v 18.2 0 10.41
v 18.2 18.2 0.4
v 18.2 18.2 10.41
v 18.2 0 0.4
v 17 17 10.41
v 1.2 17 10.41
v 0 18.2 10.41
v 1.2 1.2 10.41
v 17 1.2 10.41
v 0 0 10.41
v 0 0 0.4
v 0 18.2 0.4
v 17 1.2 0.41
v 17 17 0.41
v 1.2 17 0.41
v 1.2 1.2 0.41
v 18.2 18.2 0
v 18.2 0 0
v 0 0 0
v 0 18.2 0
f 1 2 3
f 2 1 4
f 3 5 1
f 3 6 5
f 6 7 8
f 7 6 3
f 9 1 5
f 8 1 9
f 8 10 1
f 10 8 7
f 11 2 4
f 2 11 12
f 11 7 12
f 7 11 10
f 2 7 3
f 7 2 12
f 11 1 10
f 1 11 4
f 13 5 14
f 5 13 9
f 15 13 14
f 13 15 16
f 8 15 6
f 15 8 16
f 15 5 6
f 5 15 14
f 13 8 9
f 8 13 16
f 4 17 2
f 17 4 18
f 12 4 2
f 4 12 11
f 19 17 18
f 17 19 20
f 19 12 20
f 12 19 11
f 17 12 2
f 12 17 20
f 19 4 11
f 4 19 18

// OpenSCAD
// file: ../../Base/Boxes.scad
// Fischertechnik Box Foundation
// Pre-designed Boxes

use <Constants.scad>

include <PlacementOptions.scad>

box190Width = 190;
box190Depth = 130;
box130Width = 130;
box130Depth = 95;
boxUsageHeight = 33.9;
boxWallThickness = 2.4;
boxBaseThickness = 1.0;
boxWebWidth = 3.0;

// getBoxWallThickness()
// Gets the wall thickness of a Fischertechnik Box

function getBoxWallThickness() = boxWallThickness;

// Gets the usable height of a fischertechnik box
function getBoxUsageHeight() = boxUsageHeight;

// Gets the thickness of the Fischertechnik box base.
function getBoxBaseThickness() = boxBaseThickness;

// Gets the width of a box web
function getBoxWebWidth() = boxWebWidth;

// Gets the usable inner space of a Box 190 as an x/y-list
function getBox190Space() = [
    box190Width - 2*getBoxWallThickness(), 
    box190Depth - 2*getBoxWallThickness() ];

// Imports the Fischertechnik empty box 130x190 mm and places it at position 0,0
// 190x130 are the outer sizes, the inner space is slightly smaller. Use getBox190Space() to get the inner sizes.
// This module needs the STL file "Fischertechnik Box 130x190.stl" in the library path.
// The box is positioned that the usable inner space is at the 0,0,0 position. The

module Box190() {
    translate([-getBoxWallThickness(),-getBoxWallThickness(),-getBoxBaseThickness()])
        import("Fischertechnik Box 130x190.stl", convexity=3);
}

// Gets the usable inner space of a Box 130 as an x/y-list
function getBox130Space() = [
    box130Width - 2*getBoxWallThickness(), 
    box130Depth - 2*getBoxWallThickness() ];

// Imports the Fischertechnik empty box 95x130 mm and places it at position 0,0
// 190x130 are the outer sizes, the inner space is slightly smaller. Use getBox190Space() to get the inner sizes.
// This module needs the STL file "Fischertechnik Box 95x130.stl" in the library path.
// The box is positioned that the usable inner space is at the 0,0,0 position. The

module Box130() {
    translate([-getBoxWallThickness(),-getBoxWallThickness(),-getBoxBaseThickness()])
        import("Fischertechnik Box 95x130.stl", convexity=3);
}

// Creates a web at the specified box walls
// corner 0 = LowerLeft, 1 = UpperLeft, 2 = UpperRight, 3 = LowerRight
// side 0 = LeftOfCorner, 1 = RightOfCorner
// distance = Distance in mm from the corner
// box = inner width and depth of the box (default: Box 190)
// webWidth = length of the web (default is 3 mms)
// webThickness = thickness of the web (default is 1 mm)

module BoxWeb(corner, side, distance, box=getBox190Space(), webWidth=getBoxWebWidth(), webThickness=1.0) {
    sink = getBoxWallThickness()/2;

    width = (corner % 2 == 0) ? 
            (side == LeftOfCorner ? webWidth : webThickness) :
            (side == LeftOfCorner ? webThickness : webWidth);

    depth = (corner % 2 == 0) ? 
            (side == RightOfCorner ? webWidth : webThickness) :
            (side == RightOfCorner ? webThickness : webWidth);
    
    xDiff = corner == LowerLeft ? 
                (side == LeftOfCorner ? -sink : distance) :
            (corner == UpperLeft ?                
                (side == LeftOfCorner ? distance : -sink) :
            (corner == UpperRight ?
                (side == LeftOfCorner ? box.x-webWidth+sink : box.x-distance-webThickness) :
                (side == LeftOfCorner ? box.x-distance-webThickness: box.x-webWidth+sink)));

    yDiff = corner == LowerLeft ? 
                (side == RightOfCorner ? -sink : distance) :
            (corner == UpperLeft ?
                (side == RightOfCorner ? box.y-distance : box.y-webWidth+sink) :
            (corner == UpperRight ?
                (side == RightOfCorner ? box.y-webWidth+sink : box.y-distance) :
                (side == RightOfCorner ? distance : -sink)));
    
    translate([xDiff, yDiff, -getExcess()])
        cube([width, depth, boxUsageHeight + 2*getExcess()]);
}
// file: ../../Base/Rotation.scad
// Fischertechnik Box Foundation
// Geometry Helpers Rotation

include <PlacementOptions.scad>

// getRotatedSpace(space, rotation=NoRotation)
// Rotates the space dependent on the specified rotation

function getRotatedSpace(space, rotation=NoRotation) = [
    (rotation == Rotate90 || rotation == Rotate270) ? space.y : space.x,
    (rotation == Rotate90 || rotation == Rotate270) ? space.x : space.y
];

// Rotates the given space around the fixed left lower corner
// space = the space the children needs as width/depth list [width,depth]
// rotation = 0 Rotate0 degrees, 1 Rotate90 degrees, 2 Rotate180 degrees, 3 Rotate270 degrees (equivalent to -90)

module RotateFix(space, rotation=Rotate0) {
    dy = (rotation == Rotate0 || rotation == Rotate270) ? 0 :
        (rotation == Rotate90) ? space.x :
        space.y;
    dx = (rotation < Rotate180) ? 0 :
        (rotation == Rotate180) ? space.x :
        space.y;
    
    translate([dx, dy, 0])
        rotate([0, 0, rotations[rotation]])
            children();
}
// file: ../../Base/Alignment.scad
// Fischertechnik Box Foundation
// Geometry Helpers Alignment

include <PlacementOptions.scad>

// getAlignedX(elementWidth, spaceWidth, align=AlignRight, offset=0)
// Gets the aligned X offset of an element with the given
// width in the given space.
// elementWidth = The width of the element to positon
// spaceWidth = The space where the element should be aligned
// align = 0 AlignLeft, 1 AlignCenter, 2 AlignRight
// offset = an optional offset from the aligned position. When
// aligned left or centered, then positive values are in X direction.
// When aligned right then positive values are in negative X direction.

function getAlignedX(elementWidth, spaceWidth, align=AlignRight, offset=0) =
    (align == AlignLeft) ?
        offset :
        ((align == AlignCenter) ?
        (spaceWidth - elementWidth)/2 + offset :
        spaceWidth - offset - elementWidth);

// getAlignedY(elementDepth, spaceDepth, align=AlignTop, offset=0)
// Gets the aligned Y offset of an element with the given
// depth in the given space.
// elementDepth = The depth of the element to positon
// spaceDepth = The space where the element should be aligned
// align = 0 AlignBottom, 1 AlignCenter, 2 AlignTop
// offset = an optional offset from the aligned position. When
// aligned bottom or centered, then positive values are in Y direction.
// When aligned top then positive values are in negative Y direction.

function getAlignedY(elementDepth, spaceDepth, align=AlignTop, offset=0) =
    (align == AlignBottom) ?
        offset :
        ((align == AlignCenter) ?
        (spaceDepth - elementDepth)/2 + offset :
        spaceDepth - offset - elementDepth);
// file: ../../Base/PlacementOptions.scad
// Fischertechnik Box Foundation
// Placement Options

// Alignment
NoAlign = 0;
AlignLeft = 1;
AlignBottom = 2;
AlignCenter = 3;
AlignRight = 4;
AlignTop = 5;

// Element rotation degree steps
rotations = [0, -90, -180, -270];

// Rotation
NoRotation = 0;
Rotate0 = 0;
Rotate90 = 1;
Rotate180 = 2;
Rotate270 = 3;

// Docking (seen from above)
NoDock = -1;
DockLeft = 0;
DockTop = 1;
DockRight = 2;
DockCorner = 2;
DockBottom = 3;

// Web corners
LowerLeft = 0;
UpperLeft = 1;
UpperRight = 2;
LowerRight = 3;

// Web position relative to corner
LeftOfCorner = 0;
RightOfCorner = 1;
// file: ../../Base/Placement.scad
// Fischertechnik Box Foundation
// Geometry Helpers Placement

use <Constants.scad>
use <Alignment.scad>
use <Rotation.scad>
use <Boxes.scad>

include <PlacementOptions.scad>

// Place(x=0, y=0, elementSpace=[0,0], alignX=AlignLeft, alignY=AlignBottom, rotation=Rotate0, boxSpace=getBox190Space())
// Places the child at the specified position
// y = Y-Position. This is a relative position when an X aligment is specified.
// x = X-Position. This is a relative position when an Y aligment is specified.
// elementSpace = space of the element to be placed [x,y]
// alignX = -1=NoAlign, 0 AlignLeft, 1 AlignCenter, 3 AlignRight (elementSpace and boxSpace required!)
// alignY = -1=NoAlign, 2 AlignBottom, 1 AlignCenter, 4 AlignTop (elementSpace and boxSpace required!)
// rotation = 0 Rotate0 0 degrees, 1 Rotate90 90 degrees, 
// 2 Rotate180 180 degrees, 3 Rotate270 270 degrees (equivalent to -90)
// boxSpace = Inner space of the box where the placement occurs [x,y] - default is Box 190x130 inner space

module Place(x=0, y=0, elementSpace=[0,0], 
  alignX=AlignLeft, alignY=AlignBottom, 
  rotation=NoRotation, boxSpace=getBox190Space()) {

    module Position(x, y, space, rotation=Rotate0) {
        translate([x, y, 0])
            RotateFix(space, rotation)
                children();
    }

    space = getRotatedSpace(elementSpace, rotation);
    alignedX = getAlignedX(space.x, boxSpace.x, alignX, x);
    alignedY = getAlignedY(space.y, boxSpace.y, alignY, y);
    Position(alignedX, alignedY, elementSpace, rotation)
        children();
}

// Center(space=getBox130Space(), elementSpace=[0,0])
// space = Space where the children is centered. For cylinder use centered=true and no elementSpace.
// elementSpace = space of the element to be centered [x,y]

module Center(space=getBox190Space(), elementSpace=[0,0]) {
    translate([(space.x - elementSpace.x) / 2, (space.y - elementSpace.y) / 2])
        children(0);
}

// CenterHorizontal(width=0, y=0, offset=0, space=getBox130Space())
// space = Space where the children is centered. For cylinder use centered=true and no elementSpace.
// elementSpace = space of the element to be centered [x,y]

module CenterHorizontal(width=0, y=0, offset=0, space=getBox190Space()) {
    translate([(space.x - width) / 2 + offset, y])
        children(0);
}

// CenterVertical(depth=0, x=0, offset=0, space=getBox130Space())
// space = Space where the children is centered. For cylinder use centered=true and no elementSpace.
// elementSpace = space of the element to be centered [x,y]

module CenterVertical(depth=0, x=0, offset=0, space=getBox190Space()) {
    translate([x, (space.y - depth) / 2 + offset])
        children(0);
}
// file: ../../Elements/AxisClip10.scad
// Fischertechnik Box Library
// Axis for clip 10
// 31023

use <../ModelBase/Simple.scad>

width = 12;
depth = 12;
height = 23;

// getAxisClip10Space()
// Gets the space of a frame for a clip 10 with spring ring (mot2)

function getAxisClip10Space() = [width, depth, height];

// AxisClip10()
// Axis for clip 10 with spring ring (mot2)

module AxisClip10() {
    LeveledAxisWithSpace(height, height-10, getAxisClip10Space());
}

// Tests
color("lightgray")
AxisClip10();
// file: ../../Base/Constants.scad
// Fischertechnik Box Foundation
// Constants

// Constant values necessary for multiple elements

// Base constants
dividerThickness = 1.2;
excess = 0.01;
fragments = 90;
tolerance = 0.8;

// Gets the thickness of a divider 
function getDividerThickness() = dividerThickness;

// Gets the excess that is used to merge walls into each other
function getExcess() = excess;

// Gets amount of fragments of a cylinder
function getFragments() = fragments;

// Gets the inner tolerance of a frame to each side
function getTolerance() = tolerance;


// Fischertechnik specific constants
axisDiameter = 4;
axisBottomDiameter = axisDiameter + 1;
standardEdgeDistance = 2.5;
standardWebDistance = 11.5;
standardCornerLength = 15;
tubeWallFactor = 0.8;

// Gets axis diameter
function getAxisDiameter() = axisDiameter;

// Gets axis bottom diameter for thicker part at the bottom
function getAxisBottomDiameter() = axisBottomDiameter;

// gets the standard distance to the wall of the box for dockable frames with webs
function getStandardEdgeDistance() = standardEdgeDistance;

// gets the standard distance of each web to the corner of the dockable frame
function getStandardWebDistance() = standardWebDistance;

// gets the standard length of the corner walls of a dockable frame
function getStandardCornerLength() = standardCornerLength;

// gets the wall thickness of a tube.
function getTubeWallThickness() = tubeWallFactor * getDividerThickness();
// file: ../../Elements/FrameStandardBlock.scad
// Fischertechnik Box Library
// Frame for standard blocks
// 31003, 31004, 31005 etc.

use <../ModelBase/Simple.scad>

width = 15;
depth = 15;
height = 10;

// getFrameSmallBlockSpace(columns=1, rows=1)
// Gets the space of a frame for columns x rows

function getFrameStandardBlockSpace(columns=1, rows=1) = getFrameOuterVolume([width * columns, depth * rows, height]);

// FrameSmallBlock(columns=1, rows=1, height=10)
// frame for columns x rows 15x15
// columns = Count of 15 mm blocks in X direction
// rows = Count of 15 mm blocks in Y direction
// height = Height of frame walls (default  is 10)

module FrameStandardBlock(columns=1, rows=1, height=height) {
    Frame([width * columns, depth * rows, height]);
}

// Tests
color("lightgray")
FrameStandardBlock();
// file: ../TestPrint.scad
// 3D Print Test Base

use <../Base/Constants.scad>

use <../Elements/AxisClip10.scad>

module TestPrint(elementSpace) {
    cube([elementSpace.x, elementSpace.y, 0.4]);
    translate([0,0,0.4+getExcess()]) {
        children();
    }
}

TestPrint(getAxisClip10Space())
    AxisClip10();
// main file
// 3D Print Test Base
// FrameStandardBlock

use <../TestPrint.scad>
use <../../Elements/FrameStandardBlock.scad>

TestPrint(getFrameStandardBlockSpace())
    FrameStandardBlock();
